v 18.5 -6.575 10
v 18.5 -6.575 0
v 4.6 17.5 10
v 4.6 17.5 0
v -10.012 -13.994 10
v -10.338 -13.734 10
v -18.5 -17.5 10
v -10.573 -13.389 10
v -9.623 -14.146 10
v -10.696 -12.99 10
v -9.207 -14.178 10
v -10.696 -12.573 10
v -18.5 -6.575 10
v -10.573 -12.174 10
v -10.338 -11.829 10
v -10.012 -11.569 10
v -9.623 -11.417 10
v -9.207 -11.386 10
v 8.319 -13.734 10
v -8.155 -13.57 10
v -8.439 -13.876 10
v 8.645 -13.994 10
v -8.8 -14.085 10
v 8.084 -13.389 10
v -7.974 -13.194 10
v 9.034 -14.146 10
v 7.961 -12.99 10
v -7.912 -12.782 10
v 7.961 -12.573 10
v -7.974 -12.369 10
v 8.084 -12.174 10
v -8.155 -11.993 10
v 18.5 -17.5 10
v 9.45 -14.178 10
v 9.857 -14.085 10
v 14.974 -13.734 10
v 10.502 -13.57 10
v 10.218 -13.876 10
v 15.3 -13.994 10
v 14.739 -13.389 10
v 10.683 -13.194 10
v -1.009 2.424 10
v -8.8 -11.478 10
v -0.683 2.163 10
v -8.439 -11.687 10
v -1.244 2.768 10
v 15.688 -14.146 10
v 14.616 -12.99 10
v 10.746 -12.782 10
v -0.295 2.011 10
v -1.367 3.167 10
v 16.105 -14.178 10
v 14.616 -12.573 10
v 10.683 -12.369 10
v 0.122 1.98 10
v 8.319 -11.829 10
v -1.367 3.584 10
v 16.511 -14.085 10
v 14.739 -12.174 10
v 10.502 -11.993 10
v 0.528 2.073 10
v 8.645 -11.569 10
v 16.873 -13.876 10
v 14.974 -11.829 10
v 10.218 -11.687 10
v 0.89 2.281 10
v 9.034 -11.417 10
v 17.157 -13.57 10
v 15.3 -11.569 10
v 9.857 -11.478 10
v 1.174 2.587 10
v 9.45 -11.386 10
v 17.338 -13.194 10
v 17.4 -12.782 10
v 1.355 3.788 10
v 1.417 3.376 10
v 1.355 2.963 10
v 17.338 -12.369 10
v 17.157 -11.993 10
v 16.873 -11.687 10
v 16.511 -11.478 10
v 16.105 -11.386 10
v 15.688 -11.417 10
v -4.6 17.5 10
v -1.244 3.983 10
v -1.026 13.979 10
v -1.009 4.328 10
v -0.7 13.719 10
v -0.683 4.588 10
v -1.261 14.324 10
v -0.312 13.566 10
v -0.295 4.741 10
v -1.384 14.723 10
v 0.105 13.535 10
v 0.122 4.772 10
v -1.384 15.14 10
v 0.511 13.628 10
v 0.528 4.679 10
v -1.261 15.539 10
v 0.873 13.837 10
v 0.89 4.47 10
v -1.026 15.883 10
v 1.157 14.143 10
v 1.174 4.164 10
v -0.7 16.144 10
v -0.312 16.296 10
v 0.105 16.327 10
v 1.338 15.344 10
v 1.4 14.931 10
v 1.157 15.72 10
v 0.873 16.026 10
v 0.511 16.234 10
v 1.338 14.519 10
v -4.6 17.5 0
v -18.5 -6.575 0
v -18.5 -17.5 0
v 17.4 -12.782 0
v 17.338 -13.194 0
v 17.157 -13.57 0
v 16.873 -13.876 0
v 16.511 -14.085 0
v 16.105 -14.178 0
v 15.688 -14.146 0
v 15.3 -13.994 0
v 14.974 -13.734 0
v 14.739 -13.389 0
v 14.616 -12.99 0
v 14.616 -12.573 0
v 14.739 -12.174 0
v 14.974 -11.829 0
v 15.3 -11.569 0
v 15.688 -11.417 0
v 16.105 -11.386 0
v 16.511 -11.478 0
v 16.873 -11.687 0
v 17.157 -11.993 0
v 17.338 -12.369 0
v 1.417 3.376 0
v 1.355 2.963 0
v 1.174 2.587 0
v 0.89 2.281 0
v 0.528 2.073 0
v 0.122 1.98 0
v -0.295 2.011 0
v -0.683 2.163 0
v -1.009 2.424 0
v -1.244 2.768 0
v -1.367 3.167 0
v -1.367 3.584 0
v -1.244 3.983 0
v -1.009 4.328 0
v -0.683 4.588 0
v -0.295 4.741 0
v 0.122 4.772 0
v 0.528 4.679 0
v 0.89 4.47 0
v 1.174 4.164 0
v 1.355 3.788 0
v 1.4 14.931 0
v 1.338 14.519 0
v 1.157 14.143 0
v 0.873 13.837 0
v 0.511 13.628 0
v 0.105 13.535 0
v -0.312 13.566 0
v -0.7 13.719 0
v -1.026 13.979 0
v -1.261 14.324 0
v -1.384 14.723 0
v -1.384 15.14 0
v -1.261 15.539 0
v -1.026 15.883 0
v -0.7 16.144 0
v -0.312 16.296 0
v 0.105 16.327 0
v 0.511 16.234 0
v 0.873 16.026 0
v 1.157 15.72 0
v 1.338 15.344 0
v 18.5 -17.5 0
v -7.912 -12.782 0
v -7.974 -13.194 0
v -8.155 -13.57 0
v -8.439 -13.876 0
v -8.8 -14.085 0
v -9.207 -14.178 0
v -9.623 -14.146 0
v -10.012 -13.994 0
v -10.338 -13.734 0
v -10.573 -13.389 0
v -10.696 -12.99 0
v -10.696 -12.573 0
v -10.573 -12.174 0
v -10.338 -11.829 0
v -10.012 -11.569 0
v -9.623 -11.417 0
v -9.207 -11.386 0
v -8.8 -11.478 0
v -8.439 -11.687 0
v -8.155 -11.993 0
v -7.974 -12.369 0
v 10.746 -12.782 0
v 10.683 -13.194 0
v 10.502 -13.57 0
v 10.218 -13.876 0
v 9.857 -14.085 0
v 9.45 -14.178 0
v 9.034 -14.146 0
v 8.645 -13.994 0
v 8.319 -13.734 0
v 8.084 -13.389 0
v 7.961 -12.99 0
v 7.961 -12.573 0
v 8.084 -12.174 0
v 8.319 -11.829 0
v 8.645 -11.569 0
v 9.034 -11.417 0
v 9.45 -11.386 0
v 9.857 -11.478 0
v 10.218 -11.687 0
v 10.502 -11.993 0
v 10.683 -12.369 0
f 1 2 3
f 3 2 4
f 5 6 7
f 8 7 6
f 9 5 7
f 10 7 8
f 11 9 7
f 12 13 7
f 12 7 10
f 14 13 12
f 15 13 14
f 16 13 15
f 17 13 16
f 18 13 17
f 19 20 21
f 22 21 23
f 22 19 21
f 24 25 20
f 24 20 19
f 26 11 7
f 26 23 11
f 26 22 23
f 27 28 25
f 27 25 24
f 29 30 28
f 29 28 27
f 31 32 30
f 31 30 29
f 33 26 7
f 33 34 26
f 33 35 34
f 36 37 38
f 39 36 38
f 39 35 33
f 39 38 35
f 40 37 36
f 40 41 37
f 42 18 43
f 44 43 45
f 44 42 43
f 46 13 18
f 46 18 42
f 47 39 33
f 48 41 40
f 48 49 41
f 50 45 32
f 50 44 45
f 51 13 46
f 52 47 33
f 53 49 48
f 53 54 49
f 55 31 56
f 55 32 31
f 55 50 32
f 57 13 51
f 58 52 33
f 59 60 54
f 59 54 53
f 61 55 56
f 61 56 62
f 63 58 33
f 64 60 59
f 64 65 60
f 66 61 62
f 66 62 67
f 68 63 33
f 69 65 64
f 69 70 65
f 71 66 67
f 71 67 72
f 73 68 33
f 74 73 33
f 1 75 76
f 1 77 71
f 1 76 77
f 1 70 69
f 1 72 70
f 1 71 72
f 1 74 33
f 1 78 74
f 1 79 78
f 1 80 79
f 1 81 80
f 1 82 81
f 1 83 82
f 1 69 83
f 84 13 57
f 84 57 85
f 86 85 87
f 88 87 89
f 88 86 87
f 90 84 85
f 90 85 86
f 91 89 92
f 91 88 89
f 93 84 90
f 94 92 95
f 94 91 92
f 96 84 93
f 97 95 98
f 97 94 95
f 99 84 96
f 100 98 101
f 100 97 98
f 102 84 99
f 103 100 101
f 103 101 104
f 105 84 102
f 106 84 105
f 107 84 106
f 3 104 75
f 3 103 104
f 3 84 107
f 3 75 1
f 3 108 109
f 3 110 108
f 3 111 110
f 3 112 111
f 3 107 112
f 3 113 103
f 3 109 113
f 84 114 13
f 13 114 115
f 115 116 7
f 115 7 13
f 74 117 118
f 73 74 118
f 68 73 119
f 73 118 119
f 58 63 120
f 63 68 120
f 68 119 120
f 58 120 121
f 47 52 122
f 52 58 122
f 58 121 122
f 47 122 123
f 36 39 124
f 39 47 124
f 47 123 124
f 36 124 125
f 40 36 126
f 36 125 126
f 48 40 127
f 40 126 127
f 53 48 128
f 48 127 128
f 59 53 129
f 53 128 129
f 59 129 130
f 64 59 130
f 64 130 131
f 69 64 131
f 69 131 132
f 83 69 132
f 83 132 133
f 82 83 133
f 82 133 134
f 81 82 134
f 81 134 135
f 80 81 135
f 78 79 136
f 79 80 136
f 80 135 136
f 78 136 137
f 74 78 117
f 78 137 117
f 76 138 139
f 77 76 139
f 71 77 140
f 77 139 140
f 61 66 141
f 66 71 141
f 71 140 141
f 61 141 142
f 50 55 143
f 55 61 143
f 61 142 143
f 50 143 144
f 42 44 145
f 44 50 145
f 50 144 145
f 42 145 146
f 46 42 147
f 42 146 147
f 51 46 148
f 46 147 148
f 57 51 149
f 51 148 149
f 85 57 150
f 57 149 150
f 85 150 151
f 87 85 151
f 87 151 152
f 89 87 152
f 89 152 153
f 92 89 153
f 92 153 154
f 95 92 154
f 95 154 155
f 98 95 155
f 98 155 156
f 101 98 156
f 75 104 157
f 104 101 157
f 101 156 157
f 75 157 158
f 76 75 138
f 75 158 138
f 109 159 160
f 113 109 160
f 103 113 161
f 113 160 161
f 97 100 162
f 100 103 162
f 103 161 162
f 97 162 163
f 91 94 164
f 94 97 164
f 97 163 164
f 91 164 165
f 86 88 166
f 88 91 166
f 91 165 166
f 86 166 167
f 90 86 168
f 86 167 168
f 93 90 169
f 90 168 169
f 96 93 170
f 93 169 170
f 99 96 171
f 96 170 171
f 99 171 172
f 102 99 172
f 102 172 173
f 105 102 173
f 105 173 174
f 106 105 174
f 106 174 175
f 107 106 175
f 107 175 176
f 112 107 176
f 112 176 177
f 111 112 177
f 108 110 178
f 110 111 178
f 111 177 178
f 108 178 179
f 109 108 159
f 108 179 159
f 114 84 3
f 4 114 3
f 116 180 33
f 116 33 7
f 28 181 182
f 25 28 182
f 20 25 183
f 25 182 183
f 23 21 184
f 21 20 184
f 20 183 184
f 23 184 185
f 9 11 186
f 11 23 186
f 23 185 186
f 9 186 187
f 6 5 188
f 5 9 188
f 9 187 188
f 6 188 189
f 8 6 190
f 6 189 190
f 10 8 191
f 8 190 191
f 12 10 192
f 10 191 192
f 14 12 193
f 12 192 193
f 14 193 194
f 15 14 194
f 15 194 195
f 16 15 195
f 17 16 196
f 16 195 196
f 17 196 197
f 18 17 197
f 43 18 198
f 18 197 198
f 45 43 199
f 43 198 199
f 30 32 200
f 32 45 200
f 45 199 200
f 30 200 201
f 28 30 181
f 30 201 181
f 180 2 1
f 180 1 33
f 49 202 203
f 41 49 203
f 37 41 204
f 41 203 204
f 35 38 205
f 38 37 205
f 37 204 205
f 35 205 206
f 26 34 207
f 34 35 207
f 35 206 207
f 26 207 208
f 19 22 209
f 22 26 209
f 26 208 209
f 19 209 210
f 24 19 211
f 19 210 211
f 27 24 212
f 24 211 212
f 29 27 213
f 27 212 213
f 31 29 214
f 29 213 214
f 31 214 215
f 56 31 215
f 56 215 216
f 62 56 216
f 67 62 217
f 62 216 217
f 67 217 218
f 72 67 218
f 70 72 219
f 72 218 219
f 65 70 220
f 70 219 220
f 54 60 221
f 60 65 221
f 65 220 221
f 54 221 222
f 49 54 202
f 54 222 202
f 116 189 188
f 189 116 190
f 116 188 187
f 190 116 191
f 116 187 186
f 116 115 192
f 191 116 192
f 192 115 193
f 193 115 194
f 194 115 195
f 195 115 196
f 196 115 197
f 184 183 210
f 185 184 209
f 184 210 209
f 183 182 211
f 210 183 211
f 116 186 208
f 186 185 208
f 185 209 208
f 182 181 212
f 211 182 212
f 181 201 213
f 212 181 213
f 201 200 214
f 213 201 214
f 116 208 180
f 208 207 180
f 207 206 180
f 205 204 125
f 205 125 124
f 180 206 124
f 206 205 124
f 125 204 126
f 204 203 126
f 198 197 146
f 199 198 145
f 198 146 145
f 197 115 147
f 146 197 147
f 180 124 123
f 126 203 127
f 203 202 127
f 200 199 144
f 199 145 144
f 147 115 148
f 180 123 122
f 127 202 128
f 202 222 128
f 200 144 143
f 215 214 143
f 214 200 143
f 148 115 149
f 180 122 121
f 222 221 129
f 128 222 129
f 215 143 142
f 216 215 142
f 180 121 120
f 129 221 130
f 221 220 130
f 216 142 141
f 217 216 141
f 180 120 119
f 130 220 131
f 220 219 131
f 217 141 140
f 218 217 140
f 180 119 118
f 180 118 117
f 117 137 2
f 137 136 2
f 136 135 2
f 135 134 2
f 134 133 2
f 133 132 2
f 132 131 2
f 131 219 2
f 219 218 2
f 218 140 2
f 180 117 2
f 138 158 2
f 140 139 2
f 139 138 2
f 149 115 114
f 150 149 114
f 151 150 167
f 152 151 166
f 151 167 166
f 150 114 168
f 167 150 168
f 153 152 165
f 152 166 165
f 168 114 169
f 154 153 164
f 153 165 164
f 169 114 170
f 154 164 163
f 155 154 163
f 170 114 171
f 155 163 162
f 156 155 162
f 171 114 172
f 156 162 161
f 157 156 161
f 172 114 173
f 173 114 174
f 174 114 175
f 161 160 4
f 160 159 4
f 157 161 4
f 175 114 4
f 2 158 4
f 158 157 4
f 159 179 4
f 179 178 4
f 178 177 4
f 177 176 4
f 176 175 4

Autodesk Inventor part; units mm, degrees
ref_plane "YZ Plane" through (0, 0, 0) normal (1, 0, 0) x (0, 1, 0)
ref_plane "XZ Plane" through (0, 0, 0) normal (0, 1, 0) x (-1, 0, 0)
ref_plane "XY Plane" through (0, 0, 0) normal (0, 0, 1) x (1, 0, 0)
sketch "Sketch1" plane through (0, 0, 0) normal (0, 0, 1) x (1, 0, 0)
  line L0 (18.5, -17.5) -> (-18.5, -17.5)
  line L1 (-18.5, -17.5) -> (-18.5, 17.5)
  line L2 (-18.5, 17.5) -> (18.5, 17.5)
  line L3 (18.5, 17.5) -> (18.5, -17.5)
  line L4 (18.5, -17.5) -> (-18.5, 17.5) construction
  line L5 (-18.5, -17.5) -> (18.5, 17.5) construction
  line L6 (0, 14.9312) -> (16, -12.7816) construction
  line L7 (16, -12.7816) -> (-16, -12.7816) construction
  line L8 (-16, -12.7816) -> (0, 14.9312) construction
  line L9 (-9.3116, -12.7816) -> (0.017, 3.3758) construction
  line L10 (0.017, 3.3758) -> (9.3455, -12.7816) construction
  line L11 (9.3455, -12.7816) -> (-9.3116, -12.7816) construction
  circle A0 centre (0, 14.9312) radius 1.4
  circle A1 centre (16, -12.7816) radius 1.4
  circle A2 centre (9.3455, -12.7816) radius 1.4
  circle A3 centre (0.017, 3.3758) radius 1.4
  circle A4 centre (-9.3116, -12.7816) radius 1.4
  line L12 (-4.6002, 17.5) -> (-18.5, -6.5752)
  line L13 (18.5, -6.5752) -> (4.6002, 17.5)
  point P0 (0, 0)
  point P1 (0, -3.544)
  point P2 (0.017, -7.3958)
  dimension "d0" = 37
  dimension "d1" = 35
  dimension "d3" = 32
  dimension "d4" = 0
  dimension "d5" = 2.8
  dimension "d6" = 2.8
  dimension "d7" = 2.8
  dimension "d8" = 2.8
  dimension "d9" = 2.8
extrude "Extrusion1" add sketch "Sketch1" along normal blind 10 contours L0 L1 L12 L2 L13 L3
properties part number "cellSTORM_chip_Adapter_screws"
